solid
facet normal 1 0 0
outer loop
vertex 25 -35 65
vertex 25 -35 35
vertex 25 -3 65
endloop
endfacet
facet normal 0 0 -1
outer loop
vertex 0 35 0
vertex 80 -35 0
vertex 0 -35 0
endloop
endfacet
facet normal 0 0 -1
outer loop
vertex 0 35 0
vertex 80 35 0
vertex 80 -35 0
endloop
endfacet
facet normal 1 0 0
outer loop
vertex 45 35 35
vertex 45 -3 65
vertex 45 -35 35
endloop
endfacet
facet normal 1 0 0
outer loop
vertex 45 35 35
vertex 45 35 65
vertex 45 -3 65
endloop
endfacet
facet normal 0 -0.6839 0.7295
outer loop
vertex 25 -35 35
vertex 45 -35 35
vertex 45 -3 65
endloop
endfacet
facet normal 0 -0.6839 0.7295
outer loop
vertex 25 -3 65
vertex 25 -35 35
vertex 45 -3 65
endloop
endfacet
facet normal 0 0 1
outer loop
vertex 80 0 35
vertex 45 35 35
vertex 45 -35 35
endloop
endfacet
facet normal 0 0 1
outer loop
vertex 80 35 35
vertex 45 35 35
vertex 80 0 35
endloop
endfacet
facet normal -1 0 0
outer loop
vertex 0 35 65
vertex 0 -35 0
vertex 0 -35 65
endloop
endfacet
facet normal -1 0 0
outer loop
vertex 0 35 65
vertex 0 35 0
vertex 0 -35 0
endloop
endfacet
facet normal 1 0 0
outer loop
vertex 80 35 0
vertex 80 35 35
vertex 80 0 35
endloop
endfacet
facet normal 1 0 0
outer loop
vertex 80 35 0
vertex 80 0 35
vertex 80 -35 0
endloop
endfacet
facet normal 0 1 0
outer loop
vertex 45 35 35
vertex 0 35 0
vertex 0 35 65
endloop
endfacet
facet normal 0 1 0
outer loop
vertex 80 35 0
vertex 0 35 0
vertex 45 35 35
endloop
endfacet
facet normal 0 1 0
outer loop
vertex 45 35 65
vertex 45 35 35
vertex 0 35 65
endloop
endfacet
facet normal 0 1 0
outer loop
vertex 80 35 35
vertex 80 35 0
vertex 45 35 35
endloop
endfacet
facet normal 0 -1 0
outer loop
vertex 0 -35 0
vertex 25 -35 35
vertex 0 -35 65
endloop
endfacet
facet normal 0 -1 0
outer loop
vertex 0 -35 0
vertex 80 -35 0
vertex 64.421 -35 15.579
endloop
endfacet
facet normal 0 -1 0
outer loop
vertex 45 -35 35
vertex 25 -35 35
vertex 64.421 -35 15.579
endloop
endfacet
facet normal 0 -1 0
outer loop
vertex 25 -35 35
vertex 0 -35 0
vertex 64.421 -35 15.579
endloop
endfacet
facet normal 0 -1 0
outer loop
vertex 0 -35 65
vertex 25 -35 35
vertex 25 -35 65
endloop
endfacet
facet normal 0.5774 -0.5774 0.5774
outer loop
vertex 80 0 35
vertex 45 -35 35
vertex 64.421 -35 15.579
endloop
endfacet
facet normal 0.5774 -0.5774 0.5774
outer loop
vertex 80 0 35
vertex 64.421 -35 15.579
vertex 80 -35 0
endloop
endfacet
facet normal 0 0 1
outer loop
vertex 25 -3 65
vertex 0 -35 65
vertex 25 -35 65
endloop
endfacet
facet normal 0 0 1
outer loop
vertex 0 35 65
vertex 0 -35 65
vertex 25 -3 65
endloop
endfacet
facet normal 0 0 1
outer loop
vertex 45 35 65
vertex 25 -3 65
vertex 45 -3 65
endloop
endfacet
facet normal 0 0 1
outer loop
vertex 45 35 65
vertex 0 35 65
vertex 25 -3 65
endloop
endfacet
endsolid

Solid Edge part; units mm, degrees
sketch "Sketch1" plane through (0, 0, 0) normal (0, -1, 0) x (1, 0, 0)
  line L0 (80, 35) -> (80, 0)
  line L1 (80, 0) -> (0, 0)
  line L2 (0, 0) -> (0, 65)
  line L3 (0, 65) -> (45, 65)
  line L4 (45, 65) -> (45, 35)
  line L5 (45, 35) -> (80, 35)
extrude "ExtrudedProtrusion_1" add sketch "Sketch1" along normal mid plane 70
sketch "Sketch2" plane through (45, 0, 50) normal (1, 0, 0) x (0, 1, 0)
  line L0 (-35, 15) -> (-35, -15)
  line L1 (-35, -15) -> (-3, 15)
  line L2 (-3, 15) -> (-35, 15)
extrude "ExtrudedCutout_1" cut sketch "Sketch2" against normal blind 20
sketch "Sketch3" plane through (80, 0, 35) normal (0.5774, -0.5774, 0.5774) x (-0.7071, -0.7071, 0)
  line L0 (24.7487, 42.8661) -> (0, 0)
  line L1 (0, 0) -> (49.4975, 0)
  line L2 (49.4975, 0) -> (24.7487, 42.8661)
extrude "Cutout1" cut sketch "Sketch3" along normal up to next
